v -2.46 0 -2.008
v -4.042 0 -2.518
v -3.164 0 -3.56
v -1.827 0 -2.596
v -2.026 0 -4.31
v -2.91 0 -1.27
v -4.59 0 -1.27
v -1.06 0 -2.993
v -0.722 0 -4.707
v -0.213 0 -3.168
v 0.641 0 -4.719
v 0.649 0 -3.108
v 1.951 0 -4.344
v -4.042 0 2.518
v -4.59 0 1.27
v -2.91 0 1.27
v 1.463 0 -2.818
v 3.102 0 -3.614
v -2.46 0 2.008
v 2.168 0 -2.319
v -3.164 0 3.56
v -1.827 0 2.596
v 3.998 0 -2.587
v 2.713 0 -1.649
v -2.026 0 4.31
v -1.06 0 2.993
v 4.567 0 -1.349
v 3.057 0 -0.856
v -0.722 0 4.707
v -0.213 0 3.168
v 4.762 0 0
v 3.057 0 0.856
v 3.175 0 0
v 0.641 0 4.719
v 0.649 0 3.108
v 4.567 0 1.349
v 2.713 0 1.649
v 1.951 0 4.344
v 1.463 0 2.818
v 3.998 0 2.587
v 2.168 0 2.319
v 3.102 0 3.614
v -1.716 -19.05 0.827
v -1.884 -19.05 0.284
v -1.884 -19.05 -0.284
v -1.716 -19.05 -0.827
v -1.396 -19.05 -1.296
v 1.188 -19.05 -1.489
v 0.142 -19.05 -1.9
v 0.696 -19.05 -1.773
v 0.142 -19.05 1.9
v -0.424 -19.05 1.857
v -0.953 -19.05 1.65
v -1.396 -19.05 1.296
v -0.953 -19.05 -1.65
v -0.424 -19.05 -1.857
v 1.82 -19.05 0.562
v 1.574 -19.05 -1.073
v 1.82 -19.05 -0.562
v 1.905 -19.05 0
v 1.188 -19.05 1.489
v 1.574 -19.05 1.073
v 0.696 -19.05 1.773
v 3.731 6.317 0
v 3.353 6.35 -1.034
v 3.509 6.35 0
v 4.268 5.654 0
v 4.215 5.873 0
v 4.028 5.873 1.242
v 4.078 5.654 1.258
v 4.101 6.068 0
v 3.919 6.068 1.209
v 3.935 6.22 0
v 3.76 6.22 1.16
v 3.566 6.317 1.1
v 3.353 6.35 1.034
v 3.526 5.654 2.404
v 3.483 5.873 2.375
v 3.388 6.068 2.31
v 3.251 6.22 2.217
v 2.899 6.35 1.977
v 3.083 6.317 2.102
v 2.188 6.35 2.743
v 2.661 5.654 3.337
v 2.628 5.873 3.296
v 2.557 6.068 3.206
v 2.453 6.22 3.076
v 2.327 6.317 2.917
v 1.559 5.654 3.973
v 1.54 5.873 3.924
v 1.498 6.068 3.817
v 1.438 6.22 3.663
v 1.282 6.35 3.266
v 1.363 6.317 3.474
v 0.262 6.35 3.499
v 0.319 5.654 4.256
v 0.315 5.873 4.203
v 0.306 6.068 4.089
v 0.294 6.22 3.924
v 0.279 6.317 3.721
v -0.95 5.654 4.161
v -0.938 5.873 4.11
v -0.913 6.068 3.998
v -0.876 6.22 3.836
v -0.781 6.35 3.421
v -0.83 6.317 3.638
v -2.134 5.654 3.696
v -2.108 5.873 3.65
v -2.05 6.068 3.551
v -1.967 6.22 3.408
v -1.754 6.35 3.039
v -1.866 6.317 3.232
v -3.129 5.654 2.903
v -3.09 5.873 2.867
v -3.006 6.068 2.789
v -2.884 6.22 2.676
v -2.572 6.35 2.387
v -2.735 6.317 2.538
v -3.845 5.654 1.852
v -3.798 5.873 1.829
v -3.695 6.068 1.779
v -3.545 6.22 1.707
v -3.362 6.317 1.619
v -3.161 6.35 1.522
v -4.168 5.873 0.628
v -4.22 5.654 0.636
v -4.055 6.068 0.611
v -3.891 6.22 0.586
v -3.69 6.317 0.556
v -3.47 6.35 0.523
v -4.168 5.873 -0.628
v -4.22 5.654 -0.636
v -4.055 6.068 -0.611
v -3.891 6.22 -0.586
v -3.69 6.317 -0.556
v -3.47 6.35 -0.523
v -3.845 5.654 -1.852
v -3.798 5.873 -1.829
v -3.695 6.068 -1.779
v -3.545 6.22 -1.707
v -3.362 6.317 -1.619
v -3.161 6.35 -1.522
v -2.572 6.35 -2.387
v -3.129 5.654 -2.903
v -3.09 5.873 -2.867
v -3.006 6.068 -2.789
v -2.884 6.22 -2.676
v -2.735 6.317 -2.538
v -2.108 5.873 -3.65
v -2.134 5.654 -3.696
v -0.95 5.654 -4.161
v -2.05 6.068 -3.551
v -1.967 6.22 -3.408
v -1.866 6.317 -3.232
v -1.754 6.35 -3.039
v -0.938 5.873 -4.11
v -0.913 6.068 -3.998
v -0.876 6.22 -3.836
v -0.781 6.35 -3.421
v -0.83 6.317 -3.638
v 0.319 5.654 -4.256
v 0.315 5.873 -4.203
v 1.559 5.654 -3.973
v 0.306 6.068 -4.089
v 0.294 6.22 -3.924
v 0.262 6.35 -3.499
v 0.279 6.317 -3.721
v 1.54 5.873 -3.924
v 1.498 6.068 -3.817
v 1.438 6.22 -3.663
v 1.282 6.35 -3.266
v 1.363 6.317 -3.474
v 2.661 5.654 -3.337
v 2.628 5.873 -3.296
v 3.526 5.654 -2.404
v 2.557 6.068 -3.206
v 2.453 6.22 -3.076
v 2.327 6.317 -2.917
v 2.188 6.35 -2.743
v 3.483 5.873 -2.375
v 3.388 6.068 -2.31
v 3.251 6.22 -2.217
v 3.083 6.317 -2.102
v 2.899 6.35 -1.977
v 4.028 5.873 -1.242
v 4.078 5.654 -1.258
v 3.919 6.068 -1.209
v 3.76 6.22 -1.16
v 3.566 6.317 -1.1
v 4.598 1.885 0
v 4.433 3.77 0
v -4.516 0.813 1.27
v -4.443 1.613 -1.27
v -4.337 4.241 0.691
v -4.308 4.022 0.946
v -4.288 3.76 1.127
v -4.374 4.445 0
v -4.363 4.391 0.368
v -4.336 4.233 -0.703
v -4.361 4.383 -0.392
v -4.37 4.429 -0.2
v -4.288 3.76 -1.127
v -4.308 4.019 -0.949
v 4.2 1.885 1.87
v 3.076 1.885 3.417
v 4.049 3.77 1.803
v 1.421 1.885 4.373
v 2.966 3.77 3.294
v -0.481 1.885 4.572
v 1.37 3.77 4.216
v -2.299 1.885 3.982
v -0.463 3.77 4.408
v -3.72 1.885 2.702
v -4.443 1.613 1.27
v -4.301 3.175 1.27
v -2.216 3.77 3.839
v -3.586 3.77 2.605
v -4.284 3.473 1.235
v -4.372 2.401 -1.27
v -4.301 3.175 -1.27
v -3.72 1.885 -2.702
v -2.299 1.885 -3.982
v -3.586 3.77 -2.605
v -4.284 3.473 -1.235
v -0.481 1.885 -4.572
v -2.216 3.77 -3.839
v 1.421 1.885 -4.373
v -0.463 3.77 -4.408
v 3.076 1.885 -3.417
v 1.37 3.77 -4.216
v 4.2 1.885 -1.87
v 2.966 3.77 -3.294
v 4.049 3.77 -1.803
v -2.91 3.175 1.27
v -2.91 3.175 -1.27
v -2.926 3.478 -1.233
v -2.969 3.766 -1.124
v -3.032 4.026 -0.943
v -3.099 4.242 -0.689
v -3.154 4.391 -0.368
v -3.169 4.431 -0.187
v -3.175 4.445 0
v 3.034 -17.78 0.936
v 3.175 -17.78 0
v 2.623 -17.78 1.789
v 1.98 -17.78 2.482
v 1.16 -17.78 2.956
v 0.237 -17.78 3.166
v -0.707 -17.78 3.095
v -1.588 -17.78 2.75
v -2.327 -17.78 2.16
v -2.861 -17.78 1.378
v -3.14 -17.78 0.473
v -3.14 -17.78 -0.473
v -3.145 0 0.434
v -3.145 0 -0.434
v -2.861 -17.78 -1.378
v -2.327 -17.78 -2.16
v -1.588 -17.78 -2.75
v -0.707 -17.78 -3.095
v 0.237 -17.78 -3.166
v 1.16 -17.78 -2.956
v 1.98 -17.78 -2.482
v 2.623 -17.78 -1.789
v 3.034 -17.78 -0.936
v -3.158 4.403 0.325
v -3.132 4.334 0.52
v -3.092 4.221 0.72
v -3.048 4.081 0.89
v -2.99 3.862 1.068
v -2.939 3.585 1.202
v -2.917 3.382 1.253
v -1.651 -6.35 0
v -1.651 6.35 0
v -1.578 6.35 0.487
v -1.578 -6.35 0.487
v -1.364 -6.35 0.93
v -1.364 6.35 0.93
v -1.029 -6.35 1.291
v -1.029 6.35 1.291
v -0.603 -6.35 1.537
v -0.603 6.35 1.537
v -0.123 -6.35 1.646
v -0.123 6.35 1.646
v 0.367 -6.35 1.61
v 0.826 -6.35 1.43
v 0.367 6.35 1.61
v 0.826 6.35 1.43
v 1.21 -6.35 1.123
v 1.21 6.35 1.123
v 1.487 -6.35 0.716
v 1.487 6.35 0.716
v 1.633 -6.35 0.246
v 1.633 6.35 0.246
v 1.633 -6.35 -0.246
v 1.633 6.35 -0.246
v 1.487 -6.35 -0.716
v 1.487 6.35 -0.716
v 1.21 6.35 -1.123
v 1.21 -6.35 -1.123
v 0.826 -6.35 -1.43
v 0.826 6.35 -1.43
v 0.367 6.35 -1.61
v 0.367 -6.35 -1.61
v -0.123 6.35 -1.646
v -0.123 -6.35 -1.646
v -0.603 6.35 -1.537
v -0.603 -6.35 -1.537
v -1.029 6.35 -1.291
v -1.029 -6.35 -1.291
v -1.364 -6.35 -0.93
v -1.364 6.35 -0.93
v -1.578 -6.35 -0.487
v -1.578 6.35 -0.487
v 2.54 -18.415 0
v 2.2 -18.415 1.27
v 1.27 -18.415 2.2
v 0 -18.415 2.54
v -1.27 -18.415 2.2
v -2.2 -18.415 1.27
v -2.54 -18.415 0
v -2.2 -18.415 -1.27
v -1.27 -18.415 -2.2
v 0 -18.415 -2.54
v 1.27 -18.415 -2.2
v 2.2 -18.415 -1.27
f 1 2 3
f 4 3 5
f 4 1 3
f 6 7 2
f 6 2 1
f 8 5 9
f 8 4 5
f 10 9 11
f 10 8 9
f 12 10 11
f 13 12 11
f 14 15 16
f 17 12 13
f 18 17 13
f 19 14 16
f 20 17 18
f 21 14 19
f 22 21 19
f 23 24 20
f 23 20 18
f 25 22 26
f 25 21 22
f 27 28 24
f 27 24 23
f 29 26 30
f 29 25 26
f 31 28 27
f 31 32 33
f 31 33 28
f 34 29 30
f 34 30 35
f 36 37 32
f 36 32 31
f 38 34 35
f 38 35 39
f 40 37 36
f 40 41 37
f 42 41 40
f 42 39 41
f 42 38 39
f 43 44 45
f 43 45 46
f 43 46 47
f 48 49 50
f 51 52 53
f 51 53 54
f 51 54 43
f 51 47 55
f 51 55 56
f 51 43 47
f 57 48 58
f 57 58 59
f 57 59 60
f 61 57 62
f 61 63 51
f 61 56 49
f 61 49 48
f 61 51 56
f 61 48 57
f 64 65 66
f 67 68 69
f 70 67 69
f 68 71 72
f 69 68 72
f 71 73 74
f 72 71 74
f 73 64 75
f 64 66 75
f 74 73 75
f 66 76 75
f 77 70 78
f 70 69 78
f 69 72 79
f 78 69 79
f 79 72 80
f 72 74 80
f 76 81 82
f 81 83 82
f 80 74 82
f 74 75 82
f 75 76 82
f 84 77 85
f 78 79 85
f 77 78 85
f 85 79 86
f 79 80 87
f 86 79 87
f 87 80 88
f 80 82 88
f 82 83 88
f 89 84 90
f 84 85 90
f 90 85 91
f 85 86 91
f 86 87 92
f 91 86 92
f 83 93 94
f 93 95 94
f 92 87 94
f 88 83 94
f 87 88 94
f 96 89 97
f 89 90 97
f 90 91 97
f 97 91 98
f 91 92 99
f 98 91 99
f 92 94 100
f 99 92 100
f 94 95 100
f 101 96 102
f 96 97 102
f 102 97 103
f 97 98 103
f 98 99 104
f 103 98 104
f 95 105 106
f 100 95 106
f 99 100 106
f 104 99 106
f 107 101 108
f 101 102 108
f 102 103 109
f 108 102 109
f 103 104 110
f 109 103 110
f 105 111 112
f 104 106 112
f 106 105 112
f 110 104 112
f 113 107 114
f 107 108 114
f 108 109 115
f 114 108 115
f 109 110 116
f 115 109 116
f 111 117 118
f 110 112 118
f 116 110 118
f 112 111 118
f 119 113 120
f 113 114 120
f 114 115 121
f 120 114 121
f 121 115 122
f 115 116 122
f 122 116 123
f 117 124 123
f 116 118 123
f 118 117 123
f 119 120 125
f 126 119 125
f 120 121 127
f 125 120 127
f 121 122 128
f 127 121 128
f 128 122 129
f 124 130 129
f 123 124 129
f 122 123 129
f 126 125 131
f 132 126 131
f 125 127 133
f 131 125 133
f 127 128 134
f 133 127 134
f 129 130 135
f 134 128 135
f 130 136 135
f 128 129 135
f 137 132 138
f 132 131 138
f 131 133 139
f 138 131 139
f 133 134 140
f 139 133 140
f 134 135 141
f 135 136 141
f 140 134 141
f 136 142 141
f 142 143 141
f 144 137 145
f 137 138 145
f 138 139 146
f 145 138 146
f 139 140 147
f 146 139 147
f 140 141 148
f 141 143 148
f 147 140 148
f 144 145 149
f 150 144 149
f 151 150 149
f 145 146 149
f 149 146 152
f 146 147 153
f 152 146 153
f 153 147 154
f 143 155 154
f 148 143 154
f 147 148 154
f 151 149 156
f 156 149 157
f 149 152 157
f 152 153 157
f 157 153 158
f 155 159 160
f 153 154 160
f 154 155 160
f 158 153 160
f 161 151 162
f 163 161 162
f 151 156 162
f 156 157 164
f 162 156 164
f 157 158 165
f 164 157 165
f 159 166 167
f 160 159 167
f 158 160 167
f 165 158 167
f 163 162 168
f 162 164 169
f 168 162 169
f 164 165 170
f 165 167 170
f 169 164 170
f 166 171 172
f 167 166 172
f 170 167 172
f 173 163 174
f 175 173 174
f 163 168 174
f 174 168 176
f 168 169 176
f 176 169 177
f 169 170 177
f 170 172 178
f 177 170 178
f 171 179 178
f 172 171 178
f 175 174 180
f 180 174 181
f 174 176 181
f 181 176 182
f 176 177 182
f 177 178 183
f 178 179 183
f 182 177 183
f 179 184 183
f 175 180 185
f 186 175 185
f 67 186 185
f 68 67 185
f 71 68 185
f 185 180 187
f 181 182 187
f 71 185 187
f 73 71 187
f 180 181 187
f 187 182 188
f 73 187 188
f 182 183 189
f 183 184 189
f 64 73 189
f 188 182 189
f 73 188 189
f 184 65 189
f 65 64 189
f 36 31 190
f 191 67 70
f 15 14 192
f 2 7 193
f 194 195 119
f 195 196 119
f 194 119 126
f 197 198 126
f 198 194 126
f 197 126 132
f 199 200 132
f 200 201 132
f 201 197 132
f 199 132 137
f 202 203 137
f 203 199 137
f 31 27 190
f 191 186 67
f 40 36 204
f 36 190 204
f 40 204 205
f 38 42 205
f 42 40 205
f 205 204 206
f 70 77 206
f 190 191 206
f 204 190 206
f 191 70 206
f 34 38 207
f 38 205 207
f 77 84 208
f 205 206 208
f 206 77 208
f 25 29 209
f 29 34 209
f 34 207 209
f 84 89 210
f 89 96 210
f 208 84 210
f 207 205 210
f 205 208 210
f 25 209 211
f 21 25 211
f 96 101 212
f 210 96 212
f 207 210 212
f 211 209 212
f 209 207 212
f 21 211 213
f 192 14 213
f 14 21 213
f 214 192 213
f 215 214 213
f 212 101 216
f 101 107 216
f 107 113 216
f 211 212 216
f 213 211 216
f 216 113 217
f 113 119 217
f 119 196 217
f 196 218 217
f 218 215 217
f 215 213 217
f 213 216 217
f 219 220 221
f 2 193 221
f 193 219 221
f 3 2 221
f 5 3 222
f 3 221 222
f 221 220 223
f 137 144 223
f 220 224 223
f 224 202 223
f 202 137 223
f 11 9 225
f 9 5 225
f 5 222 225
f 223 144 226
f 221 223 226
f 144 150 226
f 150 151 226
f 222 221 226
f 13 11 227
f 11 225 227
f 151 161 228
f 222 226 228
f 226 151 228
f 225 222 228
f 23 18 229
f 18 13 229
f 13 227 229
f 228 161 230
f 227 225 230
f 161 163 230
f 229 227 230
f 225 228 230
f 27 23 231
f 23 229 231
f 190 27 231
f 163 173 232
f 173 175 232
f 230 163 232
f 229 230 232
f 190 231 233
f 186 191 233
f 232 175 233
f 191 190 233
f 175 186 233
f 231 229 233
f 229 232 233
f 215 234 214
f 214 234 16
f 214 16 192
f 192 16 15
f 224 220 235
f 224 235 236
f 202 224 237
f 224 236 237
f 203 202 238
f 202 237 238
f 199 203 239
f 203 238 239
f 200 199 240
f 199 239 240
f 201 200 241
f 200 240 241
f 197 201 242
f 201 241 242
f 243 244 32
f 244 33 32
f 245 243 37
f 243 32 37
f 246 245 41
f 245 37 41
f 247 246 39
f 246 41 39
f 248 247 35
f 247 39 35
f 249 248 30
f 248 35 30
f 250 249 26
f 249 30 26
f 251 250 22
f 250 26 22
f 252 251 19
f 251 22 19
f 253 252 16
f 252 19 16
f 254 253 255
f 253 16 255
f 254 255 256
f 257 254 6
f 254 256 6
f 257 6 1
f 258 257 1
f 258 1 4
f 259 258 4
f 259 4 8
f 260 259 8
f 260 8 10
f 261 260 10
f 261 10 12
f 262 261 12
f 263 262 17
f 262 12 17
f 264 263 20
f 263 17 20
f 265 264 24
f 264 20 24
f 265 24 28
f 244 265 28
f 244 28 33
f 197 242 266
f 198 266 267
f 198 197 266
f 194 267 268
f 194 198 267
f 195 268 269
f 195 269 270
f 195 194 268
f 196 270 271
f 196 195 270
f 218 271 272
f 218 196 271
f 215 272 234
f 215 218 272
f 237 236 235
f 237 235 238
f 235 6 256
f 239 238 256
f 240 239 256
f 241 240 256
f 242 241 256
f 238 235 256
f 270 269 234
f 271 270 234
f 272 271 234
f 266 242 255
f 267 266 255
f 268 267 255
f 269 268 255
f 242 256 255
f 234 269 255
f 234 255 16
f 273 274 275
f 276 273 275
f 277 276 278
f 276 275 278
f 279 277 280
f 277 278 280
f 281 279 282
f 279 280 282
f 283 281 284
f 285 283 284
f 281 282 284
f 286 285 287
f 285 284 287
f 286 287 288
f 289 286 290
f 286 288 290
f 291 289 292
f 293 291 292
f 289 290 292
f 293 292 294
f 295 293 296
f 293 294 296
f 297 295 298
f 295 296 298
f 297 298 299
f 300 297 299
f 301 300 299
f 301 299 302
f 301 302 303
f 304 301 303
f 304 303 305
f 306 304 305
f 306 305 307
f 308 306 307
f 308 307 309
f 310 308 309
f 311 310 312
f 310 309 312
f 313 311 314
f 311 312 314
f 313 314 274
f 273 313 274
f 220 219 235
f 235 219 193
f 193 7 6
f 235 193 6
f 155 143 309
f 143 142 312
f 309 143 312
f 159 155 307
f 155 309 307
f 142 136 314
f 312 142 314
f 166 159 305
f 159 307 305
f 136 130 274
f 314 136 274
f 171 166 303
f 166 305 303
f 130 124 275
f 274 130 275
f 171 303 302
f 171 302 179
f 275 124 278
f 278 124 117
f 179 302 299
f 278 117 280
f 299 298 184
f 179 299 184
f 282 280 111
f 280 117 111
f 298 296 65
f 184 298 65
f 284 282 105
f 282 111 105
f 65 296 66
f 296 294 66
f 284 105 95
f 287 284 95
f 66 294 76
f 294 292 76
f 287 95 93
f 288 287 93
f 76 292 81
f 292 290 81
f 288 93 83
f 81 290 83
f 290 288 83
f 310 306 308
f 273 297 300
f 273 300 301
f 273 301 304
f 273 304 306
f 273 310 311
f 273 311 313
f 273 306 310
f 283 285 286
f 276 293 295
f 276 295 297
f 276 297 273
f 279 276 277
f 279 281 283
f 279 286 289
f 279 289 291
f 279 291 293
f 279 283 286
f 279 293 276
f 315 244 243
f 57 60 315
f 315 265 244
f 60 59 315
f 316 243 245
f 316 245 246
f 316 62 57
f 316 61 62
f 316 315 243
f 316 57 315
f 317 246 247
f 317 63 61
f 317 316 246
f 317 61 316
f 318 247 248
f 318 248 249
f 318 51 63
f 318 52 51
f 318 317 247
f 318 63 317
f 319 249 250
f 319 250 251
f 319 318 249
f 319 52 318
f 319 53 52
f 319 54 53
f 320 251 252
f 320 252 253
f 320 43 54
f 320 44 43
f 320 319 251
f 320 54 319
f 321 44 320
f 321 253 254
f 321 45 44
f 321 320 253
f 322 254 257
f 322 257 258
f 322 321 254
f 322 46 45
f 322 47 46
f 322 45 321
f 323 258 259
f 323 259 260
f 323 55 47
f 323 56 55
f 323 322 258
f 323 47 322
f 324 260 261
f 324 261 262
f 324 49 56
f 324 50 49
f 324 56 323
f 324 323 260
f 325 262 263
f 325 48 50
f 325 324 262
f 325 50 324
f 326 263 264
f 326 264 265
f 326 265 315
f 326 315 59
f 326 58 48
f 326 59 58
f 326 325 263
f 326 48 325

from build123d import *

# Parameters (mm, degrees)
F0_R     = 4.7625
F1_DEPTH = 6.35
F1_TAPER = 5
F2_R     = 3.175
F3_DEPTH = 19.05
F4_R     = 1.651
F5_DEPTH = 12.7
F6_SIZE  = 1.27
F7_R     = 0.762
F9_DEPTH = 4.445
F10_R    = 1.2699


# Not quite as in the source:
# - a fillet or chamfer is up to 0.001 mm smaller than in the source, because OpenCascade refuses the exact size
# - after a boolean that leaves OpenCascade's solid faulty, fix() repairs it


with BuildPart() as f1:
    # F0 (on Front) → F1 (new body)
    with BuildSketch(Plane.XZ):
        Circle(F0_R)
    extrude(amount=-F1_DEPTH, taper=F1_TAPER)

    # F2 (on face) → F3 (join)
    with BuildSketch(Plane.XZ):
        Circle(F2_R)
    extrude(amount=F3_DEPTH)

    # F4 (on face) → F5 (cut)
    with BuildSketch(Plane(origin=(0, 6.35, 0), x_dir=(-1, 0, 0), z_dir=(0, 1, 0))):
        Circle(F4_R)
    extrude(amount=-F5_DEPTH, mode=Mode.SUBTRACT)

    # F6
    f6_edges = [f1.edges().sort_by_distance(p)[0] for p in [
        (-3.175, -19.05, 0),
    ]]
    chamfer(f6_edges, length=F6_SIZE)

    # F7
    f7_edges = [f1.edges().sort_by_distance(p)[0] for p in [
        (-4.206947, 6.35, 0),
    ]]
    fillet(f7_edges, radius=F7_R)

    # F8 (on face) → F9 (cut)
    with BuildSketch(Plane.XZ):
        with BuildLine():
            ThreePointArc((-2.9099355663, -1.27), (-3.175, 0), (-2.9099355663, 1.27))
            Line((-2.9099355663, 1.27), (-4.5900442536, 1.27))
            ThreePointArc((-4.5900442536, 1.27), (-4.7625, 0), (-4.5900442536, -1.27))
            Line((-4.5900442536, -1.27), (-2.9099355663, -1.27))
        make_face()
    extrude(amount=-F9_DEPTH, mode=Mode.SUBTRACT)

    add(f1.part.fix(), mode=Mode.REPLACE)

    # F10 (radius 1.27 in the source; OpenCascade refuses exactly that, so slightly less here)
    f10_edges = [f1.edges().sort_by_distance(p)[0] for p in [
        (-3.547549, 4.445, 1.27),
        (-3.547549, 4.445, -1.27),
    ]]
    fillet(f10_edges, radius=F10_R)


solid = f1.part
